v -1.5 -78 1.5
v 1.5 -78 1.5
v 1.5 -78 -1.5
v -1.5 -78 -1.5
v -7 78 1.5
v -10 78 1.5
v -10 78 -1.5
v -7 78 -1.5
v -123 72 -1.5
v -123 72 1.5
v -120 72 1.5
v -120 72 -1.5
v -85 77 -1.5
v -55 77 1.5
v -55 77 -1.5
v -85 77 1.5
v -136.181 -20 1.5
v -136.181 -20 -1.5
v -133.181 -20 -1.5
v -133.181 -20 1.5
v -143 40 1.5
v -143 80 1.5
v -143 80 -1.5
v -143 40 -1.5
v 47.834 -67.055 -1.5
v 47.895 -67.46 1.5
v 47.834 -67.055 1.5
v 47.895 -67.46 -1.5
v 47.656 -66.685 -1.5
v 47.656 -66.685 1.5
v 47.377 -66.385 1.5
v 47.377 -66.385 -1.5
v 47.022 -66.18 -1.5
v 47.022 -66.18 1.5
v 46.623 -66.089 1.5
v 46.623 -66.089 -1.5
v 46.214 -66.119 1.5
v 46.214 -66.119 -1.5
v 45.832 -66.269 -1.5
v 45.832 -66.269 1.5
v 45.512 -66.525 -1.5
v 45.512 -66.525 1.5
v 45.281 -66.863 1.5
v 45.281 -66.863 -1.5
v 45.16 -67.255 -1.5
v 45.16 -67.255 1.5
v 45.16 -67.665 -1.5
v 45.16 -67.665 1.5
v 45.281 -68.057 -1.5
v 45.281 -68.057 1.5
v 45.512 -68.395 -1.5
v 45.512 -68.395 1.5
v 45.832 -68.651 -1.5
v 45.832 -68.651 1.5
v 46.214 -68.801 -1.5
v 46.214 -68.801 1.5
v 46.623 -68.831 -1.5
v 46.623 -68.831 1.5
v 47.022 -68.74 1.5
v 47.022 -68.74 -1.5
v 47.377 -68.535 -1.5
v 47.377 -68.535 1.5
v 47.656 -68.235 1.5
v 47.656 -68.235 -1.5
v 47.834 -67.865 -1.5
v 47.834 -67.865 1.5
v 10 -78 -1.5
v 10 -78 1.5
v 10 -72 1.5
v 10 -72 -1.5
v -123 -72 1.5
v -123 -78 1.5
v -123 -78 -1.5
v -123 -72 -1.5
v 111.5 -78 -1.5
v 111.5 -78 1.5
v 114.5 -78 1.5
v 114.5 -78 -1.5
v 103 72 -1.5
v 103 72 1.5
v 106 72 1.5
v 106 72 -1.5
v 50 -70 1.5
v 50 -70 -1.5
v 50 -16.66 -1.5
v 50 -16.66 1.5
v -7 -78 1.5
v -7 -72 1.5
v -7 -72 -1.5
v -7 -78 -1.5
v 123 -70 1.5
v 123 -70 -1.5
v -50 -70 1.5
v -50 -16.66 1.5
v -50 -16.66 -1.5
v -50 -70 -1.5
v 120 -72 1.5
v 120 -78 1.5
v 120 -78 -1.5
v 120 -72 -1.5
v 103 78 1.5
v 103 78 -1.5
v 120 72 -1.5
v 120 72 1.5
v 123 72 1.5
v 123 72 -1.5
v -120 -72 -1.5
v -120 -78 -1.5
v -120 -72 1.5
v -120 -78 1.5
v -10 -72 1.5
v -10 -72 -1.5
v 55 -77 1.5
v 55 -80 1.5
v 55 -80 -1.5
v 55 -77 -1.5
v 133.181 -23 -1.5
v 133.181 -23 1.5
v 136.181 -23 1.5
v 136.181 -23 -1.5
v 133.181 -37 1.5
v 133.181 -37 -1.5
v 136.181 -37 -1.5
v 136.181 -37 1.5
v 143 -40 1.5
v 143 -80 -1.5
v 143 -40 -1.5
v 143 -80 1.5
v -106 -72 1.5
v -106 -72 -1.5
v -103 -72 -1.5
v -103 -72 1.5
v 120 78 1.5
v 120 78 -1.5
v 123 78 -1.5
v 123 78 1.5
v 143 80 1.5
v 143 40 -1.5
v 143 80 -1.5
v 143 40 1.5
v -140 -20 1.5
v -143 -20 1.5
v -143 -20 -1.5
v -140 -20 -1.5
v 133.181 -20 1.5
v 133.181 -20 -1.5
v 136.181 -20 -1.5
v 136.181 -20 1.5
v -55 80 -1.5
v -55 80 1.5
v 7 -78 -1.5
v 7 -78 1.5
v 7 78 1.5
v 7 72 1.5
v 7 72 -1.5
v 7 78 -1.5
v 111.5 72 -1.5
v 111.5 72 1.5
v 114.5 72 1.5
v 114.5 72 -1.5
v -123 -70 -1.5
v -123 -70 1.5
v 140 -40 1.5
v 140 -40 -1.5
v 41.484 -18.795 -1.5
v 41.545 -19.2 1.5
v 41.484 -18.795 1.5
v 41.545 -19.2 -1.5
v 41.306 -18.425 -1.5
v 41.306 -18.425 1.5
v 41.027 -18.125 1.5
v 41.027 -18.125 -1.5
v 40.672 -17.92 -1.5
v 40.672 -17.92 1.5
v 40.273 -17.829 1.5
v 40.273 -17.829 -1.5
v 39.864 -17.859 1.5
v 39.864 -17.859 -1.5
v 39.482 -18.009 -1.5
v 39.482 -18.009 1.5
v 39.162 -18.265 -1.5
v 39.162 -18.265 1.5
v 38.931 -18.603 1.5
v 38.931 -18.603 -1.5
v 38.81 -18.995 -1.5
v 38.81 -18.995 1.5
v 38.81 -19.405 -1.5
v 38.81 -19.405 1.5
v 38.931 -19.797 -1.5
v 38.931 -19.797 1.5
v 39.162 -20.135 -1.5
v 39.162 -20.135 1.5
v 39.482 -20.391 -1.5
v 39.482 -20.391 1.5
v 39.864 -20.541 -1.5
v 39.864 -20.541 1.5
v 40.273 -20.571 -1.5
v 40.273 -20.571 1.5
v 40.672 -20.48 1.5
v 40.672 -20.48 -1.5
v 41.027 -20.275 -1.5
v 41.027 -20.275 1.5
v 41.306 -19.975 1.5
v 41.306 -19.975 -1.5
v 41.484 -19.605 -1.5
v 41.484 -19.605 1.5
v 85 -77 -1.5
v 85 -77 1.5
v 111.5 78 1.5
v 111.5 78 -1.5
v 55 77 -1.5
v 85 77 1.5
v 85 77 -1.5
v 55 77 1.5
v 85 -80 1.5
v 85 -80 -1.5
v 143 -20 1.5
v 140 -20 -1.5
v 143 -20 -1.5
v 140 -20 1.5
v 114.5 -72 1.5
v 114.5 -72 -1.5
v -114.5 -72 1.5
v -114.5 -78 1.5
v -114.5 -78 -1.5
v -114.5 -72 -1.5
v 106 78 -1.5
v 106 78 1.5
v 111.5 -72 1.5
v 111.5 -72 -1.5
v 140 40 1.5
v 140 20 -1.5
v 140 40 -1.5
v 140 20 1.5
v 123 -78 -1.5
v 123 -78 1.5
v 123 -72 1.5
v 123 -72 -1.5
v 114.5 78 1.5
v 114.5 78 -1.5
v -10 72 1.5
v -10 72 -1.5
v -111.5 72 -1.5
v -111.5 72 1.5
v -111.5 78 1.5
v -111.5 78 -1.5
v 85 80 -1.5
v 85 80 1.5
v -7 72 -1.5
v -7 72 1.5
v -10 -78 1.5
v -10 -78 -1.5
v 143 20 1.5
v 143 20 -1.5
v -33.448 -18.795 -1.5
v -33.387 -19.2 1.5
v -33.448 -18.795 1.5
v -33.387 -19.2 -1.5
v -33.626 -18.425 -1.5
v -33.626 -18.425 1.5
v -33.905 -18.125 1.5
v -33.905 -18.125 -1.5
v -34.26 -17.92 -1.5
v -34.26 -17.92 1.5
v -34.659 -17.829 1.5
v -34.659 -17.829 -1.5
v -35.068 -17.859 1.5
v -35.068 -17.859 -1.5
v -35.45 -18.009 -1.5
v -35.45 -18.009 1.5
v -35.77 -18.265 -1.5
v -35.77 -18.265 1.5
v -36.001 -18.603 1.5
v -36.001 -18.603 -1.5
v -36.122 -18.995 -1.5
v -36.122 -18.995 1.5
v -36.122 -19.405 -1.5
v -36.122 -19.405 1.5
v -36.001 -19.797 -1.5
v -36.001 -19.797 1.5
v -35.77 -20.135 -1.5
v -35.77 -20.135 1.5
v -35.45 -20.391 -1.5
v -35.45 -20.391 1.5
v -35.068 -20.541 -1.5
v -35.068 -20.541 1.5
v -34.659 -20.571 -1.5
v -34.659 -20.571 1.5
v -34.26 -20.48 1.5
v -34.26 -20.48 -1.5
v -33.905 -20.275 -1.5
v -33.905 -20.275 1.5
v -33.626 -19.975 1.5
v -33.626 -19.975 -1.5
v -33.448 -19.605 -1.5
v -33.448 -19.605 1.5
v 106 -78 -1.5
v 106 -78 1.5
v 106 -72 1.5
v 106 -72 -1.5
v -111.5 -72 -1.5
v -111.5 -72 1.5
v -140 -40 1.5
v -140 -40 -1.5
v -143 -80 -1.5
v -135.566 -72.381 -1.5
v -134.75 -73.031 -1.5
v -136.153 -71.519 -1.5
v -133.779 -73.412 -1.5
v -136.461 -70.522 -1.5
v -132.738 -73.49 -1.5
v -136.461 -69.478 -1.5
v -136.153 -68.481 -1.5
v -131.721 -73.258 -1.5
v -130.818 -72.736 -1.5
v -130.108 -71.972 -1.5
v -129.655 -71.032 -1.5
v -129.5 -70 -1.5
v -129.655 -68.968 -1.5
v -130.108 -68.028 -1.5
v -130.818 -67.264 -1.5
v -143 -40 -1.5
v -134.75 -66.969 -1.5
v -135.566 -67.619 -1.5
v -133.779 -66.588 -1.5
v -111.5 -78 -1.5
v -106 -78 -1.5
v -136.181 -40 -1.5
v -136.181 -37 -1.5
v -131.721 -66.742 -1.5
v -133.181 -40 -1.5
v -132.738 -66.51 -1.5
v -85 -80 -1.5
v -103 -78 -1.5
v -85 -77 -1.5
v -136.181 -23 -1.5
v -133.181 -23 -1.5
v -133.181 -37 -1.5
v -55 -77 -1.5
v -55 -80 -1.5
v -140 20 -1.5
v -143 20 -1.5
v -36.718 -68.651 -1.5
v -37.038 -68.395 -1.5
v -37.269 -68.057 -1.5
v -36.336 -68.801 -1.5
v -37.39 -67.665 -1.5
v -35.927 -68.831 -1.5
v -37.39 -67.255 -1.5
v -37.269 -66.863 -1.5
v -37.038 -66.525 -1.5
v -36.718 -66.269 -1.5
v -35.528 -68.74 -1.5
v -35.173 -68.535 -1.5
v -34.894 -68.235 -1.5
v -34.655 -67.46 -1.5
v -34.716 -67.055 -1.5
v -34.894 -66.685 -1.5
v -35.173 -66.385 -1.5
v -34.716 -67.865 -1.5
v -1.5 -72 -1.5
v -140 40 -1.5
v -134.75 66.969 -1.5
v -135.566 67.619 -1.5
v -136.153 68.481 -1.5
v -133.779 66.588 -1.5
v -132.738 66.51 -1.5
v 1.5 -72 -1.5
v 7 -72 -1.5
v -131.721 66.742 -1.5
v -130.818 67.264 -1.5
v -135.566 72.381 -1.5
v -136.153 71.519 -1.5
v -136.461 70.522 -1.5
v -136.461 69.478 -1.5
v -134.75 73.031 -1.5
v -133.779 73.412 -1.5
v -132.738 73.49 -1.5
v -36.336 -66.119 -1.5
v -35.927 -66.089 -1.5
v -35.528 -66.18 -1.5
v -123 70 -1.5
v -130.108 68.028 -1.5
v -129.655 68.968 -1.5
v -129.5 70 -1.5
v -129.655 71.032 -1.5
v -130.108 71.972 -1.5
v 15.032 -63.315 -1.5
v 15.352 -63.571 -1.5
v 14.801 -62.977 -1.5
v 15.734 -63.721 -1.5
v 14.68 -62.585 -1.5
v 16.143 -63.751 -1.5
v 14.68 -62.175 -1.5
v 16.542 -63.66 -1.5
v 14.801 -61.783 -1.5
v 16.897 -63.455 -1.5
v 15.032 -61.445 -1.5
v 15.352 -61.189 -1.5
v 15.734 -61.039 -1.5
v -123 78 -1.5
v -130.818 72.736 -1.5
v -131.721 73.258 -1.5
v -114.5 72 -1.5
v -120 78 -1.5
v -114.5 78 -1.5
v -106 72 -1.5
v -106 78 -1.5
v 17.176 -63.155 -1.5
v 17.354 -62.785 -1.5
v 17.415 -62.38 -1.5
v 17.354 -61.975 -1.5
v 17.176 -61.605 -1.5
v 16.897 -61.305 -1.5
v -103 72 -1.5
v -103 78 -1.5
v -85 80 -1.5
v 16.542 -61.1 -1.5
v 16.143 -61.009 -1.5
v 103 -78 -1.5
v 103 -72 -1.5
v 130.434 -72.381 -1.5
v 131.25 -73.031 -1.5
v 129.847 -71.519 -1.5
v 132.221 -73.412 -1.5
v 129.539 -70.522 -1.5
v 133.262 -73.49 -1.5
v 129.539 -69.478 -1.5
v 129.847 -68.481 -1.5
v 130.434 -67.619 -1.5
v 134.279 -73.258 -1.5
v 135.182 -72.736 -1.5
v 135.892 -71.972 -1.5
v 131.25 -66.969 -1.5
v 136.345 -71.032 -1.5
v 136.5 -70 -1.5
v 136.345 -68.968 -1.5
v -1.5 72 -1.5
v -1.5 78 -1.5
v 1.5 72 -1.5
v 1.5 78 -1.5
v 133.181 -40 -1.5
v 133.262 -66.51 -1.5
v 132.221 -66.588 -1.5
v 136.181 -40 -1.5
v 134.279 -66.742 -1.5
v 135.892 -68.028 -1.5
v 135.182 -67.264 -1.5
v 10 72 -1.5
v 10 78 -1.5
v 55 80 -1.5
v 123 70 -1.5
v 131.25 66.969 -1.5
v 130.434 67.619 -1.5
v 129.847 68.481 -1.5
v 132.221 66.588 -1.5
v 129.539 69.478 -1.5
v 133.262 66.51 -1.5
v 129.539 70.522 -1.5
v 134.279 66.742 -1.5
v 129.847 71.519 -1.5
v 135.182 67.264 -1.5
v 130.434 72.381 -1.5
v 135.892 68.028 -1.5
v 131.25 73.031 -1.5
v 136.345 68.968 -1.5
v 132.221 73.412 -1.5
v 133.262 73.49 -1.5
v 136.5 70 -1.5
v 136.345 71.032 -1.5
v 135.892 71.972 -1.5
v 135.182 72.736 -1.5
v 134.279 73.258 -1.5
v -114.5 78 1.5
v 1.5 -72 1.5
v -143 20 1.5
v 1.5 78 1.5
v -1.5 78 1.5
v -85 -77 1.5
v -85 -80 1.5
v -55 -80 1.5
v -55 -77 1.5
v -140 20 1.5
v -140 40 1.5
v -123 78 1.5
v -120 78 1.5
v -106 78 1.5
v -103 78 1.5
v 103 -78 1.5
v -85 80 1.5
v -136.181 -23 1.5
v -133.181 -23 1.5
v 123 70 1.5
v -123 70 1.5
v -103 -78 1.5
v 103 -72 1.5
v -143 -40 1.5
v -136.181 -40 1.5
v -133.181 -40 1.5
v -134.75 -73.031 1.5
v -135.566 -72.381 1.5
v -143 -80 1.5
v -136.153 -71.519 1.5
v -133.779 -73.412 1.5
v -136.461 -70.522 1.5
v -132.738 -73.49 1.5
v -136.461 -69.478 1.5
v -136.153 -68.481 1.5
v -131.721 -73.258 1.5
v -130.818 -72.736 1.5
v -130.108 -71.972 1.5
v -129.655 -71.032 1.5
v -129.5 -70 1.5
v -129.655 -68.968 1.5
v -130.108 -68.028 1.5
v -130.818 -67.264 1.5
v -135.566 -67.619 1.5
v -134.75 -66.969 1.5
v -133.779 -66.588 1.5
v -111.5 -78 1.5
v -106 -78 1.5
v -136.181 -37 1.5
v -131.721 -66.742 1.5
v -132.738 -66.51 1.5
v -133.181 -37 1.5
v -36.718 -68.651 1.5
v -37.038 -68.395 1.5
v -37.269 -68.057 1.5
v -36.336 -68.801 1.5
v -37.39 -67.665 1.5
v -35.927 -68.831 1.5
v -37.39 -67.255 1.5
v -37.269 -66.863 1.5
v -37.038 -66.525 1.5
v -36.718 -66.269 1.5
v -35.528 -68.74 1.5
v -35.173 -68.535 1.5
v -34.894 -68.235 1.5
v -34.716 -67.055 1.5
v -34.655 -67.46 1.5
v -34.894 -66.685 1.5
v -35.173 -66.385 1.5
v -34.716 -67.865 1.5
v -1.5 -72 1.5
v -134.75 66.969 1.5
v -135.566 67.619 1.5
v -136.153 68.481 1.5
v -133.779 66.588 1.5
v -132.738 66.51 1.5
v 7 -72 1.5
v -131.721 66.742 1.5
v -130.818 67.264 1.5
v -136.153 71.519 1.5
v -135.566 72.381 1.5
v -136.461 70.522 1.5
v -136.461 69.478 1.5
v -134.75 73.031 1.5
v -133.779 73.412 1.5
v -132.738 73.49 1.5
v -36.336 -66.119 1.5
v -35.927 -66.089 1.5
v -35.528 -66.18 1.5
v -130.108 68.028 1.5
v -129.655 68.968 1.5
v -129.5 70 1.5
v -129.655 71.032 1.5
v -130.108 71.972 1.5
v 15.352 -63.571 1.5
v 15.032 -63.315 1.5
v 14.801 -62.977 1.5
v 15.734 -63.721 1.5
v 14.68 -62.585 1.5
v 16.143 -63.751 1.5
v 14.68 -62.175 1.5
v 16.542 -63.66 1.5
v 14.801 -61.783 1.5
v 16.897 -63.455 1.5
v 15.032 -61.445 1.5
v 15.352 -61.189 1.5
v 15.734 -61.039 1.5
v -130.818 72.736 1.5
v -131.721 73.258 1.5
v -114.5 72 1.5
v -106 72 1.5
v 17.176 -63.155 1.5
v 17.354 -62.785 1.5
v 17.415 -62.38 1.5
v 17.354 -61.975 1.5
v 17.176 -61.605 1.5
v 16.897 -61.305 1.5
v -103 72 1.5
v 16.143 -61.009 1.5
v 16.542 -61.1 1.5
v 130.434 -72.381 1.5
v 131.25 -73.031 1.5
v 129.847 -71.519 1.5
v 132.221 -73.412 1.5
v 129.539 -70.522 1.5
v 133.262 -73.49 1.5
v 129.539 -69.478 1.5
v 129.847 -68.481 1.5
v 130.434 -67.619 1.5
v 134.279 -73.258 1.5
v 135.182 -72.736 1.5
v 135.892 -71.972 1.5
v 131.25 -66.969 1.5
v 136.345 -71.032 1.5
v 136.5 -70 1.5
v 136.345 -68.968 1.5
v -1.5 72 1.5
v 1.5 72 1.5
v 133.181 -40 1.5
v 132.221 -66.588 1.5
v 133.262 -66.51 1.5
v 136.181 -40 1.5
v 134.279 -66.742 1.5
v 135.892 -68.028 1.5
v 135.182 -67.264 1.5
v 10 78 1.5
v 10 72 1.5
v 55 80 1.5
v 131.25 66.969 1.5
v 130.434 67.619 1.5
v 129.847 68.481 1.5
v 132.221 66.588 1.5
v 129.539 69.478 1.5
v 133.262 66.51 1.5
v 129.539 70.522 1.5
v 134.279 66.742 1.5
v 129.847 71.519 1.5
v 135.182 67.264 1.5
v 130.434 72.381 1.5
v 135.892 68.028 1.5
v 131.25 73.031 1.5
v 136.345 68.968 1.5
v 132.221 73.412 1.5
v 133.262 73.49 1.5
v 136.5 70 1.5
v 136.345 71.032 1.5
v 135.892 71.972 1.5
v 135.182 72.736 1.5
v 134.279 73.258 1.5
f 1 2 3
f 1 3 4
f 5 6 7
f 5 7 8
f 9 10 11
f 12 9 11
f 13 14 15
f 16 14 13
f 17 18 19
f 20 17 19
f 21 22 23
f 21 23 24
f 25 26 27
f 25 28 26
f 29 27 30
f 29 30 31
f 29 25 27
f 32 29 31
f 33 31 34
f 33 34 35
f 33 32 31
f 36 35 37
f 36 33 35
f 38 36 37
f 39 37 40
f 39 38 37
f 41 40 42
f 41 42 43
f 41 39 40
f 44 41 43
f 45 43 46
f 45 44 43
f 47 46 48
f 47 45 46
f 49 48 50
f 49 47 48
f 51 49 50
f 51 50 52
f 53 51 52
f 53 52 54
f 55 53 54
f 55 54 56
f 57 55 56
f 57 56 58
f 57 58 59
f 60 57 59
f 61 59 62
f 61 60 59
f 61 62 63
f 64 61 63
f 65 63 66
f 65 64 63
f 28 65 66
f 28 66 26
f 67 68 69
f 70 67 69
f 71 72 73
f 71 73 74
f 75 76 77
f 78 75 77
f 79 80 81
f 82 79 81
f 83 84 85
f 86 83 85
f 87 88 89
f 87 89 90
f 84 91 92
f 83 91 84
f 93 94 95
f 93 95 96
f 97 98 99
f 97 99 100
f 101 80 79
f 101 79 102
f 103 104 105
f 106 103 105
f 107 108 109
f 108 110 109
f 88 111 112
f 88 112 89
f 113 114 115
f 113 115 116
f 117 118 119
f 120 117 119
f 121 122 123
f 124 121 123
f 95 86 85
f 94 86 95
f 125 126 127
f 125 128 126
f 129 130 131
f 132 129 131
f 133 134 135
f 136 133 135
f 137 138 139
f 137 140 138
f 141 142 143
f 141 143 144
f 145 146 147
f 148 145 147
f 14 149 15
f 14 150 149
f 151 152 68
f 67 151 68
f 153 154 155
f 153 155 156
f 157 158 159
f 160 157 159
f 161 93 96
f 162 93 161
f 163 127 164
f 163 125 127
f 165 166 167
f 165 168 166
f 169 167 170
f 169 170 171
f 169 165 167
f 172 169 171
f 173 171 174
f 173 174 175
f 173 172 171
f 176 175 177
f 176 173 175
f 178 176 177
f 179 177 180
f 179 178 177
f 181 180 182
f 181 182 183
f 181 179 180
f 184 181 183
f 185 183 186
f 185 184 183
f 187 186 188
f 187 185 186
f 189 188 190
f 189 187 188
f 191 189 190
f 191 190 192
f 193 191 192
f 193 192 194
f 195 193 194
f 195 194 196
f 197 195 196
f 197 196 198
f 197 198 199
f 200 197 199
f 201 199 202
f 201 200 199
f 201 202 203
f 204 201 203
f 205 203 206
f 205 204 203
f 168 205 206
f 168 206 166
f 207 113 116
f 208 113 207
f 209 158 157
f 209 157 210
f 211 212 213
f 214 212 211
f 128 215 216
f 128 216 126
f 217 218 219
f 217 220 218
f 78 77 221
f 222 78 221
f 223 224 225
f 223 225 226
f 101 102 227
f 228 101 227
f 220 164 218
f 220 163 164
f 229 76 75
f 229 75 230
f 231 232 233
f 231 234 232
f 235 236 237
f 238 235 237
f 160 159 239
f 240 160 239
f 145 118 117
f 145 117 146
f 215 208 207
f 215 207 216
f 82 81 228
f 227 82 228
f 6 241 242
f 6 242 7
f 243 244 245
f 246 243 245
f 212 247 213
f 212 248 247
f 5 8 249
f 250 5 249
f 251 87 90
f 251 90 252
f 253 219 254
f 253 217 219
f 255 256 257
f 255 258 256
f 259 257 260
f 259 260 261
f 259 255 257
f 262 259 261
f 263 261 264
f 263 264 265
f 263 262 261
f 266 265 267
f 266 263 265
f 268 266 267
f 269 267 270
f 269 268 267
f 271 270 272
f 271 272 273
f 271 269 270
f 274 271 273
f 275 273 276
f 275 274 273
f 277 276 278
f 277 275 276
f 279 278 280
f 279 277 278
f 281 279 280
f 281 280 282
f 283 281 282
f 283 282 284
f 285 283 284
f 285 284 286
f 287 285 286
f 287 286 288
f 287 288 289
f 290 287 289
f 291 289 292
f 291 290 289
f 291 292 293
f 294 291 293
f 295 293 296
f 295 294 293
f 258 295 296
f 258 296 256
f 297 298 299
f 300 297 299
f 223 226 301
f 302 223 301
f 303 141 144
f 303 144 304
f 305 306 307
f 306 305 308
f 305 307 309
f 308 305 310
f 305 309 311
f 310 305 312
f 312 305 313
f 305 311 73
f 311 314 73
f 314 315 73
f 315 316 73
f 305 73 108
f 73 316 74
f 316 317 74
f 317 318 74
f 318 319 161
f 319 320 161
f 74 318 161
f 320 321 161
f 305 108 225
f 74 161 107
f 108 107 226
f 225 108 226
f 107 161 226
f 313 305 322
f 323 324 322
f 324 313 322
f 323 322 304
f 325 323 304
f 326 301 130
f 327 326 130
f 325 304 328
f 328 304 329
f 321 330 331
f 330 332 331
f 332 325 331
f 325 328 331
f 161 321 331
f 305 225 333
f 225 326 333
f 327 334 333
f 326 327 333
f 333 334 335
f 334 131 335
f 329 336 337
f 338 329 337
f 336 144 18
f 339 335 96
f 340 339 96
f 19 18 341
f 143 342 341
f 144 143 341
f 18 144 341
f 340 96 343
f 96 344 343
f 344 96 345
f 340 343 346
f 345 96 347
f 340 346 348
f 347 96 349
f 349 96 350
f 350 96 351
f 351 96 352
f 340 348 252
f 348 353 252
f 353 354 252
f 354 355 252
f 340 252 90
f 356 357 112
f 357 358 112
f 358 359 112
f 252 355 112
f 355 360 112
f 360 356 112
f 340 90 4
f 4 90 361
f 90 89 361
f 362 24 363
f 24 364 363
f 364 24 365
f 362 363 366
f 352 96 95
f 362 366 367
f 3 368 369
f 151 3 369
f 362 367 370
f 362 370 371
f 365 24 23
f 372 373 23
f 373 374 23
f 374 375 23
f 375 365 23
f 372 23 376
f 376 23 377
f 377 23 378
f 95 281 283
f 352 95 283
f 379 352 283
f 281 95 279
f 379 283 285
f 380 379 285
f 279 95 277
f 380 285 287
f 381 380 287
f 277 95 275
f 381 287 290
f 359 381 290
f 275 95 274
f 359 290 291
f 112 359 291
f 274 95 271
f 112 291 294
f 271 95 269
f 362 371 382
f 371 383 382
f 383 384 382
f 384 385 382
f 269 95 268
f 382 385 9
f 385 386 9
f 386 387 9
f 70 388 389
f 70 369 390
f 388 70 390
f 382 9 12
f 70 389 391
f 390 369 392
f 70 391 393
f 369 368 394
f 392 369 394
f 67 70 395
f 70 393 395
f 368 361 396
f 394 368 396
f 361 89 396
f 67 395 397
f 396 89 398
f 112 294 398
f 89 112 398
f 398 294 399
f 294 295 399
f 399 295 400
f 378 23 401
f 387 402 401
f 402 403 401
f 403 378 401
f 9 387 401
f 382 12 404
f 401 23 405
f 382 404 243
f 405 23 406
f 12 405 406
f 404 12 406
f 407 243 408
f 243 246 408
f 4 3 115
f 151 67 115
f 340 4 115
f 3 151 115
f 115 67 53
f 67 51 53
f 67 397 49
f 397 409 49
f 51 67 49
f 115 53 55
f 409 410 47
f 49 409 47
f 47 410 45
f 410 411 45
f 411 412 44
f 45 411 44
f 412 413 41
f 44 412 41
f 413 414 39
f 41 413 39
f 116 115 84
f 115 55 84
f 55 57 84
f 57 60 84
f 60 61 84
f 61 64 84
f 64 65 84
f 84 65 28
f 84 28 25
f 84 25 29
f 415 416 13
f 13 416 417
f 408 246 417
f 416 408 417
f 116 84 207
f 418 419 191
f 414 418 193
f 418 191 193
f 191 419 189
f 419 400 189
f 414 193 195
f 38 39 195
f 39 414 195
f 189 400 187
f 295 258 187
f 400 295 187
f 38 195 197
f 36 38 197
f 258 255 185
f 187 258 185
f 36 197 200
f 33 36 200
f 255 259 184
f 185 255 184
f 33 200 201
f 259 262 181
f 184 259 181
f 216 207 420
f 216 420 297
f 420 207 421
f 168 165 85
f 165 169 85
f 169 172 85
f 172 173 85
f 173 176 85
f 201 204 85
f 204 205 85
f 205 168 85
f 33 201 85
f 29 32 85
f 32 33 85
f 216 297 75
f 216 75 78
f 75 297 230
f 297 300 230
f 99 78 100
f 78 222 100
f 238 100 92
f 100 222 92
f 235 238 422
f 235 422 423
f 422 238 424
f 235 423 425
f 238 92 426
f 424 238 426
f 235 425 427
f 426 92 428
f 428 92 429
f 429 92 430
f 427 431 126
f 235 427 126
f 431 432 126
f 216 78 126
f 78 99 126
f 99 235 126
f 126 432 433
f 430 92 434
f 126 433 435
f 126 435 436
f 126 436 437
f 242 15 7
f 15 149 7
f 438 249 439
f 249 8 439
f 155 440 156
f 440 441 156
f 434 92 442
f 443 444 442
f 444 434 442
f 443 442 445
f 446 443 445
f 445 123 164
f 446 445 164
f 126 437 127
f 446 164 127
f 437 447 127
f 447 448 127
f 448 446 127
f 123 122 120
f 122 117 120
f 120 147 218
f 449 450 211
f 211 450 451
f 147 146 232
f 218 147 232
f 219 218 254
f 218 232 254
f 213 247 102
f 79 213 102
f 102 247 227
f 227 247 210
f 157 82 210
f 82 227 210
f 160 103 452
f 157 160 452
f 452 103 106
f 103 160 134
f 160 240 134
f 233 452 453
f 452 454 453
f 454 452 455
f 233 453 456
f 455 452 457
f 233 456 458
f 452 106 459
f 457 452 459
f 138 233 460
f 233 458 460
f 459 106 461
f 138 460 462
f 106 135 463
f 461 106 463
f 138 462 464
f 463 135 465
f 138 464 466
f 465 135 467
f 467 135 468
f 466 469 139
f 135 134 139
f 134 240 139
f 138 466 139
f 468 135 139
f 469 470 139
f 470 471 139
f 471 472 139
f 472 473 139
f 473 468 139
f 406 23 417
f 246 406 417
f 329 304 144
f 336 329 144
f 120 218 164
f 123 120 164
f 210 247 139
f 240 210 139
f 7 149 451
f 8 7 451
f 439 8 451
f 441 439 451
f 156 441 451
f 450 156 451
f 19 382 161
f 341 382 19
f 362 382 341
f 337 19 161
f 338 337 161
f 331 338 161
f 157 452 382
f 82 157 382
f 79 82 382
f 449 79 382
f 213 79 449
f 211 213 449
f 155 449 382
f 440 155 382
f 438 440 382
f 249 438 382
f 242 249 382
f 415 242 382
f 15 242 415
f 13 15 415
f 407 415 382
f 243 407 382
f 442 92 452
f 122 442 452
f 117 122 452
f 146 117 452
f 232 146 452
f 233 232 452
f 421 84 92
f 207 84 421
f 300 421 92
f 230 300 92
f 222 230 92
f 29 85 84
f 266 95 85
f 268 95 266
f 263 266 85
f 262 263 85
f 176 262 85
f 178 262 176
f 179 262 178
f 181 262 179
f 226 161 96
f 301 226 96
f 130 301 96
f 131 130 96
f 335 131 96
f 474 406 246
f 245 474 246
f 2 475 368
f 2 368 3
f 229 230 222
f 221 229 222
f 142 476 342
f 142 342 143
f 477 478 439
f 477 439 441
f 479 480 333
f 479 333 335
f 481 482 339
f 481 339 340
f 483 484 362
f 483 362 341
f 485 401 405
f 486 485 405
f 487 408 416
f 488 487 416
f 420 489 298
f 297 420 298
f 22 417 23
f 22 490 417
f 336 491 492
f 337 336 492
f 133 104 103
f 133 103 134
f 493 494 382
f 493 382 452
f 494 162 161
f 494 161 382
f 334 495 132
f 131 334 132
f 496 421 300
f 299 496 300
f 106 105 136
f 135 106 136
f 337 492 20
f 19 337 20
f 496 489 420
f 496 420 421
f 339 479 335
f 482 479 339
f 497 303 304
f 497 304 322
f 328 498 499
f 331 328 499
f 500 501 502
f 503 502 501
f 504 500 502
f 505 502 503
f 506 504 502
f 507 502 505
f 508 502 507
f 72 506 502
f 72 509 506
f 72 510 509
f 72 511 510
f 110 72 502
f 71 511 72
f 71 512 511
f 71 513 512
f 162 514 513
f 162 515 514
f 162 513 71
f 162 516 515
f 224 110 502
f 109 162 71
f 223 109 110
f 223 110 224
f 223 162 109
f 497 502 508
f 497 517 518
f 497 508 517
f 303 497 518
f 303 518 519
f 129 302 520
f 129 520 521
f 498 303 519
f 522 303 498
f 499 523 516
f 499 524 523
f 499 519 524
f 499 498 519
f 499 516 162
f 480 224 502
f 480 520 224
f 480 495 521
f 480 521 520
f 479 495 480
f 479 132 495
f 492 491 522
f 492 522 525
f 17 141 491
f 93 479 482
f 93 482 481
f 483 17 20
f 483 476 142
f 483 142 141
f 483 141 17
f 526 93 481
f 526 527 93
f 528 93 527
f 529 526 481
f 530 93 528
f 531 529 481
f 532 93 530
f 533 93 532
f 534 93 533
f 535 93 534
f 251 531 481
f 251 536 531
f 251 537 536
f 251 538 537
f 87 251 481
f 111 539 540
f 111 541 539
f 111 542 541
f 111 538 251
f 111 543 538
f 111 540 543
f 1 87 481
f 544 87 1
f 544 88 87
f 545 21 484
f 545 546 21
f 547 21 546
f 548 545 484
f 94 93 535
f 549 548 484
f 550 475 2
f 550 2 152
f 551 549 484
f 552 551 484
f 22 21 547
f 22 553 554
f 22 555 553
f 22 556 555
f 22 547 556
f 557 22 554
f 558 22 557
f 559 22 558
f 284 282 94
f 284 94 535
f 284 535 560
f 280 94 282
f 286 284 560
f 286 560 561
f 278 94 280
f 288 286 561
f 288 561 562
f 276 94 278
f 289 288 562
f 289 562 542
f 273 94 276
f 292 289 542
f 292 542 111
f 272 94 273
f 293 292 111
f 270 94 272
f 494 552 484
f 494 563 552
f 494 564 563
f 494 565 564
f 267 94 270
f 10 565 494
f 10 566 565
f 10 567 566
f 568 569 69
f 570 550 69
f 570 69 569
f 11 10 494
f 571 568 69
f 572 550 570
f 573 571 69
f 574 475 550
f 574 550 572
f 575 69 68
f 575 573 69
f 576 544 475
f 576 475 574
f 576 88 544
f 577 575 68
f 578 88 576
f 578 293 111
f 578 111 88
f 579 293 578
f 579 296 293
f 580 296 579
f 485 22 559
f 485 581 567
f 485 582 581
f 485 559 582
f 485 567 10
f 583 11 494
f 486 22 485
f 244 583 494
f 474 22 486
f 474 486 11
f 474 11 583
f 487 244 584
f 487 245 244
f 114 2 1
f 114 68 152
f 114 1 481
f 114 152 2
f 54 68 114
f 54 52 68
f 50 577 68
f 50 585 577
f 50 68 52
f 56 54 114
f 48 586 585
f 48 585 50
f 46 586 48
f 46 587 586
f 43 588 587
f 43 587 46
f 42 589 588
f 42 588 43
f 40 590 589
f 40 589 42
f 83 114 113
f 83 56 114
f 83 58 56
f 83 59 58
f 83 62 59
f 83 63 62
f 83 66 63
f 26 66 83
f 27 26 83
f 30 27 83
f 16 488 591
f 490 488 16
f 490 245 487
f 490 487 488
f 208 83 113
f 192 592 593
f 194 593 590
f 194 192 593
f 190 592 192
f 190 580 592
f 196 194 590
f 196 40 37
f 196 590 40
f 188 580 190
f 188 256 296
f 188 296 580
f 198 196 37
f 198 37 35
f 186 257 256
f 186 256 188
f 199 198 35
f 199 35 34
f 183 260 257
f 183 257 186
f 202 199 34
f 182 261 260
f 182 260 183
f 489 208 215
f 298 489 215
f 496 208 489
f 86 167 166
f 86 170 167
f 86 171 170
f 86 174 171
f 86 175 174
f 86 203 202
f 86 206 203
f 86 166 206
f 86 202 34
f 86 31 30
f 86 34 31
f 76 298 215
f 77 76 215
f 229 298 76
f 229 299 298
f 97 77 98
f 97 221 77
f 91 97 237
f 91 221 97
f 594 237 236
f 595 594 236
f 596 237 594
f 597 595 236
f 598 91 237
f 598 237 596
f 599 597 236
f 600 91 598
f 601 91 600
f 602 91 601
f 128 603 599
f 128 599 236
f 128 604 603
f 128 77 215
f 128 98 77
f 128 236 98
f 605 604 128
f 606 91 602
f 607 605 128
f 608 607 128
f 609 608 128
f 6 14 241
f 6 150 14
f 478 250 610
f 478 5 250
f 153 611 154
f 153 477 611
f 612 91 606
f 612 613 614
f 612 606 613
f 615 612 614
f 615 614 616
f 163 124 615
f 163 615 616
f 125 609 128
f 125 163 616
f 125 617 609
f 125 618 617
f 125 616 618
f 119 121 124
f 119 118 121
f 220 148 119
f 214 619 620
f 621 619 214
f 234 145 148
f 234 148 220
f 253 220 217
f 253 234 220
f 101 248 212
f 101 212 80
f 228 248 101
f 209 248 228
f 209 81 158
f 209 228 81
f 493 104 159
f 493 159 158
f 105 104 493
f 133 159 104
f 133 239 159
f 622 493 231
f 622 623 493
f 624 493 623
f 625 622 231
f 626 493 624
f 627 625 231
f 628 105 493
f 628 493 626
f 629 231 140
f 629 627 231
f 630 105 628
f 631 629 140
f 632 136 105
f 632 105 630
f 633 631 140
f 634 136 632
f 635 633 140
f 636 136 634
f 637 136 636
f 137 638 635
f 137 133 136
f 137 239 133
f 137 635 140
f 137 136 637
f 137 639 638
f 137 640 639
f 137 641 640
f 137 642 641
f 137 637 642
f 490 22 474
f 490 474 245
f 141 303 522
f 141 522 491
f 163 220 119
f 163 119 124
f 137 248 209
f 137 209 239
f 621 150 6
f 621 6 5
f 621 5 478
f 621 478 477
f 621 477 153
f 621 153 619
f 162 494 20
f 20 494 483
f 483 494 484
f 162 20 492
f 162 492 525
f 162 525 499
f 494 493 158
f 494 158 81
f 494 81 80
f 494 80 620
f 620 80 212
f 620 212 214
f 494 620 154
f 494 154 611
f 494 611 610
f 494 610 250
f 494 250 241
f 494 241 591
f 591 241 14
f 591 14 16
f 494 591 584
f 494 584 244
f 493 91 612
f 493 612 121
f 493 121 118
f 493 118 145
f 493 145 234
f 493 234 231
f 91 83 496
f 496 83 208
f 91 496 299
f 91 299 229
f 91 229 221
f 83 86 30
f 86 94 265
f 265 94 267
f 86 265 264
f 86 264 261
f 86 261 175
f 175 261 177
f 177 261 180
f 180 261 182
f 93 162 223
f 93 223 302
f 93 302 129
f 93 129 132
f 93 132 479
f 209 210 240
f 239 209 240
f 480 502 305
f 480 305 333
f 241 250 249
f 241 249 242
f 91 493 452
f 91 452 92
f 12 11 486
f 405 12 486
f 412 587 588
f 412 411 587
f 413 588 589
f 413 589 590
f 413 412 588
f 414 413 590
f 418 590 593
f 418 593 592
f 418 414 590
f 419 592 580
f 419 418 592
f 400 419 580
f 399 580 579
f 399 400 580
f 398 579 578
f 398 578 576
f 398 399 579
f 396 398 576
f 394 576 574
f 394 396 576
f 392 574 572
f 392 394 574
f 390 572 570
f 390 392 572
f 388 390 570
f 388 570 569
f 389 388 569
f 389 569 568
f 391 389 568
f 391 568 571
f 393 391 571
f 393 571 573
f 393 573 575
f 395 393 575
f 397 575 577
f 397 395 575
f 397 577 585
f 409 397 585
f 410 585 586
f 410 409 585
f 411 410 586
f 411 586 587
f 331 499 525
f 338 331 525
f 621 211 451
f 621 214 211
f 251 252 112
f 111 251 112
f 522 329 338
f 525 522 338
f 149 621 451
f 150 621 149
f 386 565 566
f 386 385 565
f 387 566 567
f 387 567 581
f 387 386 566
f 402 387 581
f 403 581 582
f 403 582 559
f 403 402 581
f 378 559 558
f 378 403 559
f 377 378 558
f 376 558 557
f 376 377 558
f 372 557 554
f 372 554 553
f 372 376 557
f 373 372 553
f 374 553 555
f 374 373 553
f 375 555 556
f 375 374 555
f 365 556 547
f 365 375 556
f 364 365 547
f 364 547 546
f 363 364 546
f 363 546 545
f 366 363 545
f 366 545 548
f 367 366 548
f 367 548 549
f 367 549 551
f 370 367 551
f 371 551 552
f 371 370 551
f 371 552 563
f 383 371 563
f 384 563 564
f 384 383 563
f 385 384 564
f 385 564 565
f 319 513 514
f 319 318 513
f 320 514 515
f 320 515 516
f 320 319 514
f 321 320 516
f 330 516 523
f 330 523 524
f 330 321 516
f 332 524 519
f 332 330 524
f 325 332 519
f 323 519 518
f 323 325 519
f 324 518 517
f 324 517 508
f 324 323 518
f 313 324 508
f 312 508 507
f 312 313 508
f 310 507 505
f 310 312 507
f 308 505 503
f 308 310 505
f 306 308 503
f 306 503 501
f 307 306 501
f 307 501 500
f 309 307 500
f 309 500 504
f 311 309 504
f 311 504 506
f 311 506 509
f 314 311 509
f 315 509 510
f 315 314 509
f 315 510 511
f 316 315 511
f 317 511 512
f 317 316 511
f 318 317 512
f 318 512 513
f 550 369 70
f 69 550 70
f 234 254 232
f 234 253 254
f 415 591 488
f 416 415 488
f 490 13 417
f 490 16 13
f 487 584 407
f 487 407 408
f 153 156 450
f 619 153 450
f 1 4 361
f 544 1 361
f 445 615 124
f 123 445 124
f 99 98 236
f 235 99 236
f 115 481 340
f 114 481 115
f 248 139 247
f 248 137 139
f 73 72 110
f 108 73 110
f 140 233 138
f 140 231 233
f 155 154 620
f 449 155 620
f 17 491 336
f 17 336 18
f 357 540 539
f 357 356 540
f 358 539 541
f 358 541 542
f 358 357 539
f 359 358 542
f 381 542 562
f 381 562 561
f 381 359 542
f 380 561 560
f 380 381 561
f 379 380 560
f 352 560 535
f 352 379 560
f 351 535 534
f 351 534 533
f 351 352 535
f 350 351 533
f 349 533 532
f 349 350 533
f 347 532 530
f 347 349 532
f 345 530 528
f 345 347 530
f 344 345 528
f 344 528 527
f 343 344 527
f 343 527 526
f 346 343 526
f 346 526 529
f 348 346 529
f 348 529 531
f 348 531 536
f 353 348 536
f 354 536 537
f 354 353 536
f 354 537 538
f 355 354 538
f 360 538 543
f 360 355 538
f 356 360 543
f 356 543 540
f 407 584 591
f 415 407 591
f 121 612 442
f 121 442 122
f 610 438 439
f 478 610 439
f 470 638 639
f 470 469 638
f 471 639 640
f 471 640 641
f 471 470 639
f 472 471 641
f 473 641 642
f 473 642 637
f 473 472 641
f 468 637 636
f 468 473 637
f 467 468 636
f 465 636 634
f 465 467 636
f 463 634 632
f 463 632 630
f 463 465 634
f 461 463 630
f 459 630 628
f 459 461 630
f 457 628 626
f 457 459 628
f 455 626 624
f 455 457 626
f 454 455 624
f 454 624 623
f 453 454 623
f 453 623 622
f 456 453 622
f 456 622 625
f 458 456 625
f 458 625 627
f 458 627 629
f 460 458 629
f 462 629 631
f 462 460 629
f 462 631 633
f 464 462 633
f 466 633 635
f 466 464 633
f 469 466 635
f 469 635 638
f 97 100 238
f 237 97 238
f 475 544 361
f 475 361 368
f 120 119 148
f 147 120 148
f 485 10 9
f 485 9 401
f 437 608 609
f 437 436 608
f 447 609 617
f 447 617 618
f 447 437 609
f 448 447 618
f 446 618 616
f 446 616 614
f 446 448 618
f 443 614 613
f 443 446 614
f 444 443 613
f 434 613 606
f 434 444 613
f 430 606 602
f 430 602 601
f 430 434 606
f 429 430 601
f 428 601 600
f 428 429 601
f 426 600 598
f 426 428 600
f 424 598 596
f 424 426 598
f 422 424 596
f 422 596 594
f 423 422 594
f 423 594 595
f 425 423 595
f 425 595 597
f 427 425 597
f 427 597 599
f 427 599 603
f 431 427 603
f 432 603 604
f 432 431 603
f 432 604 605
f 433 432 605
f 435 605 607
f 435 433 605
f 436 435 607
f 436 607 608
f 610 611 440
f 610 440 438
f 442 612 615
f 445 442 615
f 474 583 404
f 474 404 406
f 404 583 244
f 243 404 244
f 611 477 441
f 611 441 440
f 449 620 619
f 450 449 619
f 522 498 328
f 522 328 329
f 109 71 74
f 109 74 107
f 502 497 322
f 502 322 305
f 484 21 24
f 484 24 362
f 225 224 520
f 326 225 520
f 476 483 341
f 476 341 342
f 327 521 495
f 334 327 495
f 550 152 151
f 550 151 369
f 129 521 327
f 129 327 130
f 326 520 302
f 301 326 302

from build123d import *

# Parameters (mm, degrees)
F0_W     = 3
F0_H     = 6
F0_R     = 3.5
F0_R_2   = 1.375
F0_H_2   = 3
F1_DEPTH = 1.5


with BuildPart() as f1:
    # F0 (on Top) → F1 (new body, symmetric)
    with BuildSketch(Plane.XY):
        Polygon((-85, 80), (-143, 80), (-143, 40), (-140, 40), (-140, 20), (-143, 20), (-143, -20), (-140, -20), (-140, -40), (-143, -40), (-143, -80), (-85, -80), (-85, -77), (-55, -77), (-55, -80), (55, -80), (55, -77), (85, -77), (85, -80), (143, -80), (143, -40), (140, -40), (140, -20), (143, -20), (143, 20), (140, 20), (140, 40), (143, 40), (143, 80), (85, 80), (85, 77), (55, 77), (55, 80), (-55, 80), (-55, 77), (-85, 77), align=None)
        with Locations((-121.5, -75)):
            Rectangle(F0_W, F0_H, mode=Mode.SUBTRACT)
        with Locations((-113, -75)):
            Rectangle(F0_W, F0_H, mode=Mode.SUBTRACT)
        with Locations((-133, -70)):
            Circle(F0_R, mode=Mode.SUBTRACT)
        with Locations((-104.5, -75)):
            Rectangle(F0_W, F0_H, mode=Mode.SUBTRACT)
        with Locations((-36.03, -67.46)):
            Circle(F0_R_2, mode=Mode.SUBTRACT)
        Polygon((-7, -75), (-7, -78), (-10, -78), (-10, -75), (-10, -72), (-7, -72), align=None, mode=Mode.SUBTRACT)
        with Locations((-134.681027, -38.5)):
            Rectangle(F0_W, F0_H_2, mode=Mode.SUBTRACT)
        with Locations((-134.681027, -21.5)):
            Rectangle(F0_W, F0_H_2, mode=Mode.SUBTRACT)
        with Locations((-34.762099, -19.2)):
            Circle(F0_R_2, mode=Mode.SUBTRACT)
        Polygon((1.5, -78), (0, -78), (-1.5, -78), (-1.5, -75), (-1.5, -72), (1.5, -72), (1.5, -75), align=None, mode=Mode.SUBTRACT)
        with Locations((8.5, -75)):
            Rectangle(F0_W, F0_H, mode=Mode.SUBTRACT)
        with Locations((16.04, -62.38)):
            Circle(F0_R_2, mode=Mode.SUBTRACT)
        with Locations((46.52, -67.46)):
            Circle(F0_R_2, mode=Mode.SUBTRACT)
        with Locations((104.5, -75)):
            Rectangle(F0_W, F0_H, mode=Mode.SUBTRACT)
        with Locations((113, -75)):
            Rectangle(F0_W, F0_H, mode=Mode.SUBTRACT)
        with Locations((121.5, -75)):
            Rectangle(F0_W, F0_H, mode=Mode.SUBTRACT)
        with Locations((133, -70)):
            Circle(F0_R, mode=Mode.SUBTRACT)
        with Locations((40.17, -19.2)):
            Circle(F0_R_2, mode=Mode.SUBTRACT)
        with Locations((134.681027, -38.5)):
            Rectangle(F0_W, F0_H_2, mode=Mode.SUBTRACT)
        with Locations((134.681027, -21.5)):
            Rectangle(F0_W, F0_H_2, mode=Mode.SUBTRACT)
        with Locations((-133, 70)):
            Circle(F0_R, mode=Mode.SUBTRACT)
        with Locations((-121.5, 75)):
            Rectangle(F0_W, F0_H, mode=Mode.SUBTRACT)
        with Locations((-113, 75)):
            Rectangle(F0_W, F0_H, mode=Mode.SUBTRACT)
        with Locations((-104.5, 75)):
            Rectangle(F0_W, F0_H, mode=Mode.SUBTRACT)
        Polygon((-10, 78), (-7, 78), (-7, 75), (-7, 72), (-10, 72), (-10, 75), align=None, mode=Mode.SUBTRACT)
        Polygon((-123, 70), (123, 70), (123, -70), (50, -70), (50, -16.66), (-43, -16.66), (-50, -16.66), (-50, -70), (-123, -70), align=None, mode=Mode.SUBTRACT)
        Polygon((1.5, 75), (1.5, 72), (-1.5, 72), (-1.5, 75), (-1.5, 78), (0, 78), (1.5, 78), align=None, mode=Mode.SUBTRACT)
        with Locations((8.5, 75)):
            Rectangle(F0_W, F0_H, mode=Mode.SUBTRACT)
        with Locations((104.5, 75)):
            Rectangle(F0_W, F0_H, mode=Mode.SUBTRACT)
        with Locations((113, 75)):
            Rectangle(F0_W, F0_H, mode=Mode.SUBTRACT)
        with Locations((121.5, 75)):
            Rectangle(F0_W, F0_H, mode=Mode.SUBTRACT)
        with Locations((133, 70)):
            Circle(F0_R, mode=Mode.SUBTRACT)
    extrude(amount=F1_DEPTH, both=True)


solid = f1.part
